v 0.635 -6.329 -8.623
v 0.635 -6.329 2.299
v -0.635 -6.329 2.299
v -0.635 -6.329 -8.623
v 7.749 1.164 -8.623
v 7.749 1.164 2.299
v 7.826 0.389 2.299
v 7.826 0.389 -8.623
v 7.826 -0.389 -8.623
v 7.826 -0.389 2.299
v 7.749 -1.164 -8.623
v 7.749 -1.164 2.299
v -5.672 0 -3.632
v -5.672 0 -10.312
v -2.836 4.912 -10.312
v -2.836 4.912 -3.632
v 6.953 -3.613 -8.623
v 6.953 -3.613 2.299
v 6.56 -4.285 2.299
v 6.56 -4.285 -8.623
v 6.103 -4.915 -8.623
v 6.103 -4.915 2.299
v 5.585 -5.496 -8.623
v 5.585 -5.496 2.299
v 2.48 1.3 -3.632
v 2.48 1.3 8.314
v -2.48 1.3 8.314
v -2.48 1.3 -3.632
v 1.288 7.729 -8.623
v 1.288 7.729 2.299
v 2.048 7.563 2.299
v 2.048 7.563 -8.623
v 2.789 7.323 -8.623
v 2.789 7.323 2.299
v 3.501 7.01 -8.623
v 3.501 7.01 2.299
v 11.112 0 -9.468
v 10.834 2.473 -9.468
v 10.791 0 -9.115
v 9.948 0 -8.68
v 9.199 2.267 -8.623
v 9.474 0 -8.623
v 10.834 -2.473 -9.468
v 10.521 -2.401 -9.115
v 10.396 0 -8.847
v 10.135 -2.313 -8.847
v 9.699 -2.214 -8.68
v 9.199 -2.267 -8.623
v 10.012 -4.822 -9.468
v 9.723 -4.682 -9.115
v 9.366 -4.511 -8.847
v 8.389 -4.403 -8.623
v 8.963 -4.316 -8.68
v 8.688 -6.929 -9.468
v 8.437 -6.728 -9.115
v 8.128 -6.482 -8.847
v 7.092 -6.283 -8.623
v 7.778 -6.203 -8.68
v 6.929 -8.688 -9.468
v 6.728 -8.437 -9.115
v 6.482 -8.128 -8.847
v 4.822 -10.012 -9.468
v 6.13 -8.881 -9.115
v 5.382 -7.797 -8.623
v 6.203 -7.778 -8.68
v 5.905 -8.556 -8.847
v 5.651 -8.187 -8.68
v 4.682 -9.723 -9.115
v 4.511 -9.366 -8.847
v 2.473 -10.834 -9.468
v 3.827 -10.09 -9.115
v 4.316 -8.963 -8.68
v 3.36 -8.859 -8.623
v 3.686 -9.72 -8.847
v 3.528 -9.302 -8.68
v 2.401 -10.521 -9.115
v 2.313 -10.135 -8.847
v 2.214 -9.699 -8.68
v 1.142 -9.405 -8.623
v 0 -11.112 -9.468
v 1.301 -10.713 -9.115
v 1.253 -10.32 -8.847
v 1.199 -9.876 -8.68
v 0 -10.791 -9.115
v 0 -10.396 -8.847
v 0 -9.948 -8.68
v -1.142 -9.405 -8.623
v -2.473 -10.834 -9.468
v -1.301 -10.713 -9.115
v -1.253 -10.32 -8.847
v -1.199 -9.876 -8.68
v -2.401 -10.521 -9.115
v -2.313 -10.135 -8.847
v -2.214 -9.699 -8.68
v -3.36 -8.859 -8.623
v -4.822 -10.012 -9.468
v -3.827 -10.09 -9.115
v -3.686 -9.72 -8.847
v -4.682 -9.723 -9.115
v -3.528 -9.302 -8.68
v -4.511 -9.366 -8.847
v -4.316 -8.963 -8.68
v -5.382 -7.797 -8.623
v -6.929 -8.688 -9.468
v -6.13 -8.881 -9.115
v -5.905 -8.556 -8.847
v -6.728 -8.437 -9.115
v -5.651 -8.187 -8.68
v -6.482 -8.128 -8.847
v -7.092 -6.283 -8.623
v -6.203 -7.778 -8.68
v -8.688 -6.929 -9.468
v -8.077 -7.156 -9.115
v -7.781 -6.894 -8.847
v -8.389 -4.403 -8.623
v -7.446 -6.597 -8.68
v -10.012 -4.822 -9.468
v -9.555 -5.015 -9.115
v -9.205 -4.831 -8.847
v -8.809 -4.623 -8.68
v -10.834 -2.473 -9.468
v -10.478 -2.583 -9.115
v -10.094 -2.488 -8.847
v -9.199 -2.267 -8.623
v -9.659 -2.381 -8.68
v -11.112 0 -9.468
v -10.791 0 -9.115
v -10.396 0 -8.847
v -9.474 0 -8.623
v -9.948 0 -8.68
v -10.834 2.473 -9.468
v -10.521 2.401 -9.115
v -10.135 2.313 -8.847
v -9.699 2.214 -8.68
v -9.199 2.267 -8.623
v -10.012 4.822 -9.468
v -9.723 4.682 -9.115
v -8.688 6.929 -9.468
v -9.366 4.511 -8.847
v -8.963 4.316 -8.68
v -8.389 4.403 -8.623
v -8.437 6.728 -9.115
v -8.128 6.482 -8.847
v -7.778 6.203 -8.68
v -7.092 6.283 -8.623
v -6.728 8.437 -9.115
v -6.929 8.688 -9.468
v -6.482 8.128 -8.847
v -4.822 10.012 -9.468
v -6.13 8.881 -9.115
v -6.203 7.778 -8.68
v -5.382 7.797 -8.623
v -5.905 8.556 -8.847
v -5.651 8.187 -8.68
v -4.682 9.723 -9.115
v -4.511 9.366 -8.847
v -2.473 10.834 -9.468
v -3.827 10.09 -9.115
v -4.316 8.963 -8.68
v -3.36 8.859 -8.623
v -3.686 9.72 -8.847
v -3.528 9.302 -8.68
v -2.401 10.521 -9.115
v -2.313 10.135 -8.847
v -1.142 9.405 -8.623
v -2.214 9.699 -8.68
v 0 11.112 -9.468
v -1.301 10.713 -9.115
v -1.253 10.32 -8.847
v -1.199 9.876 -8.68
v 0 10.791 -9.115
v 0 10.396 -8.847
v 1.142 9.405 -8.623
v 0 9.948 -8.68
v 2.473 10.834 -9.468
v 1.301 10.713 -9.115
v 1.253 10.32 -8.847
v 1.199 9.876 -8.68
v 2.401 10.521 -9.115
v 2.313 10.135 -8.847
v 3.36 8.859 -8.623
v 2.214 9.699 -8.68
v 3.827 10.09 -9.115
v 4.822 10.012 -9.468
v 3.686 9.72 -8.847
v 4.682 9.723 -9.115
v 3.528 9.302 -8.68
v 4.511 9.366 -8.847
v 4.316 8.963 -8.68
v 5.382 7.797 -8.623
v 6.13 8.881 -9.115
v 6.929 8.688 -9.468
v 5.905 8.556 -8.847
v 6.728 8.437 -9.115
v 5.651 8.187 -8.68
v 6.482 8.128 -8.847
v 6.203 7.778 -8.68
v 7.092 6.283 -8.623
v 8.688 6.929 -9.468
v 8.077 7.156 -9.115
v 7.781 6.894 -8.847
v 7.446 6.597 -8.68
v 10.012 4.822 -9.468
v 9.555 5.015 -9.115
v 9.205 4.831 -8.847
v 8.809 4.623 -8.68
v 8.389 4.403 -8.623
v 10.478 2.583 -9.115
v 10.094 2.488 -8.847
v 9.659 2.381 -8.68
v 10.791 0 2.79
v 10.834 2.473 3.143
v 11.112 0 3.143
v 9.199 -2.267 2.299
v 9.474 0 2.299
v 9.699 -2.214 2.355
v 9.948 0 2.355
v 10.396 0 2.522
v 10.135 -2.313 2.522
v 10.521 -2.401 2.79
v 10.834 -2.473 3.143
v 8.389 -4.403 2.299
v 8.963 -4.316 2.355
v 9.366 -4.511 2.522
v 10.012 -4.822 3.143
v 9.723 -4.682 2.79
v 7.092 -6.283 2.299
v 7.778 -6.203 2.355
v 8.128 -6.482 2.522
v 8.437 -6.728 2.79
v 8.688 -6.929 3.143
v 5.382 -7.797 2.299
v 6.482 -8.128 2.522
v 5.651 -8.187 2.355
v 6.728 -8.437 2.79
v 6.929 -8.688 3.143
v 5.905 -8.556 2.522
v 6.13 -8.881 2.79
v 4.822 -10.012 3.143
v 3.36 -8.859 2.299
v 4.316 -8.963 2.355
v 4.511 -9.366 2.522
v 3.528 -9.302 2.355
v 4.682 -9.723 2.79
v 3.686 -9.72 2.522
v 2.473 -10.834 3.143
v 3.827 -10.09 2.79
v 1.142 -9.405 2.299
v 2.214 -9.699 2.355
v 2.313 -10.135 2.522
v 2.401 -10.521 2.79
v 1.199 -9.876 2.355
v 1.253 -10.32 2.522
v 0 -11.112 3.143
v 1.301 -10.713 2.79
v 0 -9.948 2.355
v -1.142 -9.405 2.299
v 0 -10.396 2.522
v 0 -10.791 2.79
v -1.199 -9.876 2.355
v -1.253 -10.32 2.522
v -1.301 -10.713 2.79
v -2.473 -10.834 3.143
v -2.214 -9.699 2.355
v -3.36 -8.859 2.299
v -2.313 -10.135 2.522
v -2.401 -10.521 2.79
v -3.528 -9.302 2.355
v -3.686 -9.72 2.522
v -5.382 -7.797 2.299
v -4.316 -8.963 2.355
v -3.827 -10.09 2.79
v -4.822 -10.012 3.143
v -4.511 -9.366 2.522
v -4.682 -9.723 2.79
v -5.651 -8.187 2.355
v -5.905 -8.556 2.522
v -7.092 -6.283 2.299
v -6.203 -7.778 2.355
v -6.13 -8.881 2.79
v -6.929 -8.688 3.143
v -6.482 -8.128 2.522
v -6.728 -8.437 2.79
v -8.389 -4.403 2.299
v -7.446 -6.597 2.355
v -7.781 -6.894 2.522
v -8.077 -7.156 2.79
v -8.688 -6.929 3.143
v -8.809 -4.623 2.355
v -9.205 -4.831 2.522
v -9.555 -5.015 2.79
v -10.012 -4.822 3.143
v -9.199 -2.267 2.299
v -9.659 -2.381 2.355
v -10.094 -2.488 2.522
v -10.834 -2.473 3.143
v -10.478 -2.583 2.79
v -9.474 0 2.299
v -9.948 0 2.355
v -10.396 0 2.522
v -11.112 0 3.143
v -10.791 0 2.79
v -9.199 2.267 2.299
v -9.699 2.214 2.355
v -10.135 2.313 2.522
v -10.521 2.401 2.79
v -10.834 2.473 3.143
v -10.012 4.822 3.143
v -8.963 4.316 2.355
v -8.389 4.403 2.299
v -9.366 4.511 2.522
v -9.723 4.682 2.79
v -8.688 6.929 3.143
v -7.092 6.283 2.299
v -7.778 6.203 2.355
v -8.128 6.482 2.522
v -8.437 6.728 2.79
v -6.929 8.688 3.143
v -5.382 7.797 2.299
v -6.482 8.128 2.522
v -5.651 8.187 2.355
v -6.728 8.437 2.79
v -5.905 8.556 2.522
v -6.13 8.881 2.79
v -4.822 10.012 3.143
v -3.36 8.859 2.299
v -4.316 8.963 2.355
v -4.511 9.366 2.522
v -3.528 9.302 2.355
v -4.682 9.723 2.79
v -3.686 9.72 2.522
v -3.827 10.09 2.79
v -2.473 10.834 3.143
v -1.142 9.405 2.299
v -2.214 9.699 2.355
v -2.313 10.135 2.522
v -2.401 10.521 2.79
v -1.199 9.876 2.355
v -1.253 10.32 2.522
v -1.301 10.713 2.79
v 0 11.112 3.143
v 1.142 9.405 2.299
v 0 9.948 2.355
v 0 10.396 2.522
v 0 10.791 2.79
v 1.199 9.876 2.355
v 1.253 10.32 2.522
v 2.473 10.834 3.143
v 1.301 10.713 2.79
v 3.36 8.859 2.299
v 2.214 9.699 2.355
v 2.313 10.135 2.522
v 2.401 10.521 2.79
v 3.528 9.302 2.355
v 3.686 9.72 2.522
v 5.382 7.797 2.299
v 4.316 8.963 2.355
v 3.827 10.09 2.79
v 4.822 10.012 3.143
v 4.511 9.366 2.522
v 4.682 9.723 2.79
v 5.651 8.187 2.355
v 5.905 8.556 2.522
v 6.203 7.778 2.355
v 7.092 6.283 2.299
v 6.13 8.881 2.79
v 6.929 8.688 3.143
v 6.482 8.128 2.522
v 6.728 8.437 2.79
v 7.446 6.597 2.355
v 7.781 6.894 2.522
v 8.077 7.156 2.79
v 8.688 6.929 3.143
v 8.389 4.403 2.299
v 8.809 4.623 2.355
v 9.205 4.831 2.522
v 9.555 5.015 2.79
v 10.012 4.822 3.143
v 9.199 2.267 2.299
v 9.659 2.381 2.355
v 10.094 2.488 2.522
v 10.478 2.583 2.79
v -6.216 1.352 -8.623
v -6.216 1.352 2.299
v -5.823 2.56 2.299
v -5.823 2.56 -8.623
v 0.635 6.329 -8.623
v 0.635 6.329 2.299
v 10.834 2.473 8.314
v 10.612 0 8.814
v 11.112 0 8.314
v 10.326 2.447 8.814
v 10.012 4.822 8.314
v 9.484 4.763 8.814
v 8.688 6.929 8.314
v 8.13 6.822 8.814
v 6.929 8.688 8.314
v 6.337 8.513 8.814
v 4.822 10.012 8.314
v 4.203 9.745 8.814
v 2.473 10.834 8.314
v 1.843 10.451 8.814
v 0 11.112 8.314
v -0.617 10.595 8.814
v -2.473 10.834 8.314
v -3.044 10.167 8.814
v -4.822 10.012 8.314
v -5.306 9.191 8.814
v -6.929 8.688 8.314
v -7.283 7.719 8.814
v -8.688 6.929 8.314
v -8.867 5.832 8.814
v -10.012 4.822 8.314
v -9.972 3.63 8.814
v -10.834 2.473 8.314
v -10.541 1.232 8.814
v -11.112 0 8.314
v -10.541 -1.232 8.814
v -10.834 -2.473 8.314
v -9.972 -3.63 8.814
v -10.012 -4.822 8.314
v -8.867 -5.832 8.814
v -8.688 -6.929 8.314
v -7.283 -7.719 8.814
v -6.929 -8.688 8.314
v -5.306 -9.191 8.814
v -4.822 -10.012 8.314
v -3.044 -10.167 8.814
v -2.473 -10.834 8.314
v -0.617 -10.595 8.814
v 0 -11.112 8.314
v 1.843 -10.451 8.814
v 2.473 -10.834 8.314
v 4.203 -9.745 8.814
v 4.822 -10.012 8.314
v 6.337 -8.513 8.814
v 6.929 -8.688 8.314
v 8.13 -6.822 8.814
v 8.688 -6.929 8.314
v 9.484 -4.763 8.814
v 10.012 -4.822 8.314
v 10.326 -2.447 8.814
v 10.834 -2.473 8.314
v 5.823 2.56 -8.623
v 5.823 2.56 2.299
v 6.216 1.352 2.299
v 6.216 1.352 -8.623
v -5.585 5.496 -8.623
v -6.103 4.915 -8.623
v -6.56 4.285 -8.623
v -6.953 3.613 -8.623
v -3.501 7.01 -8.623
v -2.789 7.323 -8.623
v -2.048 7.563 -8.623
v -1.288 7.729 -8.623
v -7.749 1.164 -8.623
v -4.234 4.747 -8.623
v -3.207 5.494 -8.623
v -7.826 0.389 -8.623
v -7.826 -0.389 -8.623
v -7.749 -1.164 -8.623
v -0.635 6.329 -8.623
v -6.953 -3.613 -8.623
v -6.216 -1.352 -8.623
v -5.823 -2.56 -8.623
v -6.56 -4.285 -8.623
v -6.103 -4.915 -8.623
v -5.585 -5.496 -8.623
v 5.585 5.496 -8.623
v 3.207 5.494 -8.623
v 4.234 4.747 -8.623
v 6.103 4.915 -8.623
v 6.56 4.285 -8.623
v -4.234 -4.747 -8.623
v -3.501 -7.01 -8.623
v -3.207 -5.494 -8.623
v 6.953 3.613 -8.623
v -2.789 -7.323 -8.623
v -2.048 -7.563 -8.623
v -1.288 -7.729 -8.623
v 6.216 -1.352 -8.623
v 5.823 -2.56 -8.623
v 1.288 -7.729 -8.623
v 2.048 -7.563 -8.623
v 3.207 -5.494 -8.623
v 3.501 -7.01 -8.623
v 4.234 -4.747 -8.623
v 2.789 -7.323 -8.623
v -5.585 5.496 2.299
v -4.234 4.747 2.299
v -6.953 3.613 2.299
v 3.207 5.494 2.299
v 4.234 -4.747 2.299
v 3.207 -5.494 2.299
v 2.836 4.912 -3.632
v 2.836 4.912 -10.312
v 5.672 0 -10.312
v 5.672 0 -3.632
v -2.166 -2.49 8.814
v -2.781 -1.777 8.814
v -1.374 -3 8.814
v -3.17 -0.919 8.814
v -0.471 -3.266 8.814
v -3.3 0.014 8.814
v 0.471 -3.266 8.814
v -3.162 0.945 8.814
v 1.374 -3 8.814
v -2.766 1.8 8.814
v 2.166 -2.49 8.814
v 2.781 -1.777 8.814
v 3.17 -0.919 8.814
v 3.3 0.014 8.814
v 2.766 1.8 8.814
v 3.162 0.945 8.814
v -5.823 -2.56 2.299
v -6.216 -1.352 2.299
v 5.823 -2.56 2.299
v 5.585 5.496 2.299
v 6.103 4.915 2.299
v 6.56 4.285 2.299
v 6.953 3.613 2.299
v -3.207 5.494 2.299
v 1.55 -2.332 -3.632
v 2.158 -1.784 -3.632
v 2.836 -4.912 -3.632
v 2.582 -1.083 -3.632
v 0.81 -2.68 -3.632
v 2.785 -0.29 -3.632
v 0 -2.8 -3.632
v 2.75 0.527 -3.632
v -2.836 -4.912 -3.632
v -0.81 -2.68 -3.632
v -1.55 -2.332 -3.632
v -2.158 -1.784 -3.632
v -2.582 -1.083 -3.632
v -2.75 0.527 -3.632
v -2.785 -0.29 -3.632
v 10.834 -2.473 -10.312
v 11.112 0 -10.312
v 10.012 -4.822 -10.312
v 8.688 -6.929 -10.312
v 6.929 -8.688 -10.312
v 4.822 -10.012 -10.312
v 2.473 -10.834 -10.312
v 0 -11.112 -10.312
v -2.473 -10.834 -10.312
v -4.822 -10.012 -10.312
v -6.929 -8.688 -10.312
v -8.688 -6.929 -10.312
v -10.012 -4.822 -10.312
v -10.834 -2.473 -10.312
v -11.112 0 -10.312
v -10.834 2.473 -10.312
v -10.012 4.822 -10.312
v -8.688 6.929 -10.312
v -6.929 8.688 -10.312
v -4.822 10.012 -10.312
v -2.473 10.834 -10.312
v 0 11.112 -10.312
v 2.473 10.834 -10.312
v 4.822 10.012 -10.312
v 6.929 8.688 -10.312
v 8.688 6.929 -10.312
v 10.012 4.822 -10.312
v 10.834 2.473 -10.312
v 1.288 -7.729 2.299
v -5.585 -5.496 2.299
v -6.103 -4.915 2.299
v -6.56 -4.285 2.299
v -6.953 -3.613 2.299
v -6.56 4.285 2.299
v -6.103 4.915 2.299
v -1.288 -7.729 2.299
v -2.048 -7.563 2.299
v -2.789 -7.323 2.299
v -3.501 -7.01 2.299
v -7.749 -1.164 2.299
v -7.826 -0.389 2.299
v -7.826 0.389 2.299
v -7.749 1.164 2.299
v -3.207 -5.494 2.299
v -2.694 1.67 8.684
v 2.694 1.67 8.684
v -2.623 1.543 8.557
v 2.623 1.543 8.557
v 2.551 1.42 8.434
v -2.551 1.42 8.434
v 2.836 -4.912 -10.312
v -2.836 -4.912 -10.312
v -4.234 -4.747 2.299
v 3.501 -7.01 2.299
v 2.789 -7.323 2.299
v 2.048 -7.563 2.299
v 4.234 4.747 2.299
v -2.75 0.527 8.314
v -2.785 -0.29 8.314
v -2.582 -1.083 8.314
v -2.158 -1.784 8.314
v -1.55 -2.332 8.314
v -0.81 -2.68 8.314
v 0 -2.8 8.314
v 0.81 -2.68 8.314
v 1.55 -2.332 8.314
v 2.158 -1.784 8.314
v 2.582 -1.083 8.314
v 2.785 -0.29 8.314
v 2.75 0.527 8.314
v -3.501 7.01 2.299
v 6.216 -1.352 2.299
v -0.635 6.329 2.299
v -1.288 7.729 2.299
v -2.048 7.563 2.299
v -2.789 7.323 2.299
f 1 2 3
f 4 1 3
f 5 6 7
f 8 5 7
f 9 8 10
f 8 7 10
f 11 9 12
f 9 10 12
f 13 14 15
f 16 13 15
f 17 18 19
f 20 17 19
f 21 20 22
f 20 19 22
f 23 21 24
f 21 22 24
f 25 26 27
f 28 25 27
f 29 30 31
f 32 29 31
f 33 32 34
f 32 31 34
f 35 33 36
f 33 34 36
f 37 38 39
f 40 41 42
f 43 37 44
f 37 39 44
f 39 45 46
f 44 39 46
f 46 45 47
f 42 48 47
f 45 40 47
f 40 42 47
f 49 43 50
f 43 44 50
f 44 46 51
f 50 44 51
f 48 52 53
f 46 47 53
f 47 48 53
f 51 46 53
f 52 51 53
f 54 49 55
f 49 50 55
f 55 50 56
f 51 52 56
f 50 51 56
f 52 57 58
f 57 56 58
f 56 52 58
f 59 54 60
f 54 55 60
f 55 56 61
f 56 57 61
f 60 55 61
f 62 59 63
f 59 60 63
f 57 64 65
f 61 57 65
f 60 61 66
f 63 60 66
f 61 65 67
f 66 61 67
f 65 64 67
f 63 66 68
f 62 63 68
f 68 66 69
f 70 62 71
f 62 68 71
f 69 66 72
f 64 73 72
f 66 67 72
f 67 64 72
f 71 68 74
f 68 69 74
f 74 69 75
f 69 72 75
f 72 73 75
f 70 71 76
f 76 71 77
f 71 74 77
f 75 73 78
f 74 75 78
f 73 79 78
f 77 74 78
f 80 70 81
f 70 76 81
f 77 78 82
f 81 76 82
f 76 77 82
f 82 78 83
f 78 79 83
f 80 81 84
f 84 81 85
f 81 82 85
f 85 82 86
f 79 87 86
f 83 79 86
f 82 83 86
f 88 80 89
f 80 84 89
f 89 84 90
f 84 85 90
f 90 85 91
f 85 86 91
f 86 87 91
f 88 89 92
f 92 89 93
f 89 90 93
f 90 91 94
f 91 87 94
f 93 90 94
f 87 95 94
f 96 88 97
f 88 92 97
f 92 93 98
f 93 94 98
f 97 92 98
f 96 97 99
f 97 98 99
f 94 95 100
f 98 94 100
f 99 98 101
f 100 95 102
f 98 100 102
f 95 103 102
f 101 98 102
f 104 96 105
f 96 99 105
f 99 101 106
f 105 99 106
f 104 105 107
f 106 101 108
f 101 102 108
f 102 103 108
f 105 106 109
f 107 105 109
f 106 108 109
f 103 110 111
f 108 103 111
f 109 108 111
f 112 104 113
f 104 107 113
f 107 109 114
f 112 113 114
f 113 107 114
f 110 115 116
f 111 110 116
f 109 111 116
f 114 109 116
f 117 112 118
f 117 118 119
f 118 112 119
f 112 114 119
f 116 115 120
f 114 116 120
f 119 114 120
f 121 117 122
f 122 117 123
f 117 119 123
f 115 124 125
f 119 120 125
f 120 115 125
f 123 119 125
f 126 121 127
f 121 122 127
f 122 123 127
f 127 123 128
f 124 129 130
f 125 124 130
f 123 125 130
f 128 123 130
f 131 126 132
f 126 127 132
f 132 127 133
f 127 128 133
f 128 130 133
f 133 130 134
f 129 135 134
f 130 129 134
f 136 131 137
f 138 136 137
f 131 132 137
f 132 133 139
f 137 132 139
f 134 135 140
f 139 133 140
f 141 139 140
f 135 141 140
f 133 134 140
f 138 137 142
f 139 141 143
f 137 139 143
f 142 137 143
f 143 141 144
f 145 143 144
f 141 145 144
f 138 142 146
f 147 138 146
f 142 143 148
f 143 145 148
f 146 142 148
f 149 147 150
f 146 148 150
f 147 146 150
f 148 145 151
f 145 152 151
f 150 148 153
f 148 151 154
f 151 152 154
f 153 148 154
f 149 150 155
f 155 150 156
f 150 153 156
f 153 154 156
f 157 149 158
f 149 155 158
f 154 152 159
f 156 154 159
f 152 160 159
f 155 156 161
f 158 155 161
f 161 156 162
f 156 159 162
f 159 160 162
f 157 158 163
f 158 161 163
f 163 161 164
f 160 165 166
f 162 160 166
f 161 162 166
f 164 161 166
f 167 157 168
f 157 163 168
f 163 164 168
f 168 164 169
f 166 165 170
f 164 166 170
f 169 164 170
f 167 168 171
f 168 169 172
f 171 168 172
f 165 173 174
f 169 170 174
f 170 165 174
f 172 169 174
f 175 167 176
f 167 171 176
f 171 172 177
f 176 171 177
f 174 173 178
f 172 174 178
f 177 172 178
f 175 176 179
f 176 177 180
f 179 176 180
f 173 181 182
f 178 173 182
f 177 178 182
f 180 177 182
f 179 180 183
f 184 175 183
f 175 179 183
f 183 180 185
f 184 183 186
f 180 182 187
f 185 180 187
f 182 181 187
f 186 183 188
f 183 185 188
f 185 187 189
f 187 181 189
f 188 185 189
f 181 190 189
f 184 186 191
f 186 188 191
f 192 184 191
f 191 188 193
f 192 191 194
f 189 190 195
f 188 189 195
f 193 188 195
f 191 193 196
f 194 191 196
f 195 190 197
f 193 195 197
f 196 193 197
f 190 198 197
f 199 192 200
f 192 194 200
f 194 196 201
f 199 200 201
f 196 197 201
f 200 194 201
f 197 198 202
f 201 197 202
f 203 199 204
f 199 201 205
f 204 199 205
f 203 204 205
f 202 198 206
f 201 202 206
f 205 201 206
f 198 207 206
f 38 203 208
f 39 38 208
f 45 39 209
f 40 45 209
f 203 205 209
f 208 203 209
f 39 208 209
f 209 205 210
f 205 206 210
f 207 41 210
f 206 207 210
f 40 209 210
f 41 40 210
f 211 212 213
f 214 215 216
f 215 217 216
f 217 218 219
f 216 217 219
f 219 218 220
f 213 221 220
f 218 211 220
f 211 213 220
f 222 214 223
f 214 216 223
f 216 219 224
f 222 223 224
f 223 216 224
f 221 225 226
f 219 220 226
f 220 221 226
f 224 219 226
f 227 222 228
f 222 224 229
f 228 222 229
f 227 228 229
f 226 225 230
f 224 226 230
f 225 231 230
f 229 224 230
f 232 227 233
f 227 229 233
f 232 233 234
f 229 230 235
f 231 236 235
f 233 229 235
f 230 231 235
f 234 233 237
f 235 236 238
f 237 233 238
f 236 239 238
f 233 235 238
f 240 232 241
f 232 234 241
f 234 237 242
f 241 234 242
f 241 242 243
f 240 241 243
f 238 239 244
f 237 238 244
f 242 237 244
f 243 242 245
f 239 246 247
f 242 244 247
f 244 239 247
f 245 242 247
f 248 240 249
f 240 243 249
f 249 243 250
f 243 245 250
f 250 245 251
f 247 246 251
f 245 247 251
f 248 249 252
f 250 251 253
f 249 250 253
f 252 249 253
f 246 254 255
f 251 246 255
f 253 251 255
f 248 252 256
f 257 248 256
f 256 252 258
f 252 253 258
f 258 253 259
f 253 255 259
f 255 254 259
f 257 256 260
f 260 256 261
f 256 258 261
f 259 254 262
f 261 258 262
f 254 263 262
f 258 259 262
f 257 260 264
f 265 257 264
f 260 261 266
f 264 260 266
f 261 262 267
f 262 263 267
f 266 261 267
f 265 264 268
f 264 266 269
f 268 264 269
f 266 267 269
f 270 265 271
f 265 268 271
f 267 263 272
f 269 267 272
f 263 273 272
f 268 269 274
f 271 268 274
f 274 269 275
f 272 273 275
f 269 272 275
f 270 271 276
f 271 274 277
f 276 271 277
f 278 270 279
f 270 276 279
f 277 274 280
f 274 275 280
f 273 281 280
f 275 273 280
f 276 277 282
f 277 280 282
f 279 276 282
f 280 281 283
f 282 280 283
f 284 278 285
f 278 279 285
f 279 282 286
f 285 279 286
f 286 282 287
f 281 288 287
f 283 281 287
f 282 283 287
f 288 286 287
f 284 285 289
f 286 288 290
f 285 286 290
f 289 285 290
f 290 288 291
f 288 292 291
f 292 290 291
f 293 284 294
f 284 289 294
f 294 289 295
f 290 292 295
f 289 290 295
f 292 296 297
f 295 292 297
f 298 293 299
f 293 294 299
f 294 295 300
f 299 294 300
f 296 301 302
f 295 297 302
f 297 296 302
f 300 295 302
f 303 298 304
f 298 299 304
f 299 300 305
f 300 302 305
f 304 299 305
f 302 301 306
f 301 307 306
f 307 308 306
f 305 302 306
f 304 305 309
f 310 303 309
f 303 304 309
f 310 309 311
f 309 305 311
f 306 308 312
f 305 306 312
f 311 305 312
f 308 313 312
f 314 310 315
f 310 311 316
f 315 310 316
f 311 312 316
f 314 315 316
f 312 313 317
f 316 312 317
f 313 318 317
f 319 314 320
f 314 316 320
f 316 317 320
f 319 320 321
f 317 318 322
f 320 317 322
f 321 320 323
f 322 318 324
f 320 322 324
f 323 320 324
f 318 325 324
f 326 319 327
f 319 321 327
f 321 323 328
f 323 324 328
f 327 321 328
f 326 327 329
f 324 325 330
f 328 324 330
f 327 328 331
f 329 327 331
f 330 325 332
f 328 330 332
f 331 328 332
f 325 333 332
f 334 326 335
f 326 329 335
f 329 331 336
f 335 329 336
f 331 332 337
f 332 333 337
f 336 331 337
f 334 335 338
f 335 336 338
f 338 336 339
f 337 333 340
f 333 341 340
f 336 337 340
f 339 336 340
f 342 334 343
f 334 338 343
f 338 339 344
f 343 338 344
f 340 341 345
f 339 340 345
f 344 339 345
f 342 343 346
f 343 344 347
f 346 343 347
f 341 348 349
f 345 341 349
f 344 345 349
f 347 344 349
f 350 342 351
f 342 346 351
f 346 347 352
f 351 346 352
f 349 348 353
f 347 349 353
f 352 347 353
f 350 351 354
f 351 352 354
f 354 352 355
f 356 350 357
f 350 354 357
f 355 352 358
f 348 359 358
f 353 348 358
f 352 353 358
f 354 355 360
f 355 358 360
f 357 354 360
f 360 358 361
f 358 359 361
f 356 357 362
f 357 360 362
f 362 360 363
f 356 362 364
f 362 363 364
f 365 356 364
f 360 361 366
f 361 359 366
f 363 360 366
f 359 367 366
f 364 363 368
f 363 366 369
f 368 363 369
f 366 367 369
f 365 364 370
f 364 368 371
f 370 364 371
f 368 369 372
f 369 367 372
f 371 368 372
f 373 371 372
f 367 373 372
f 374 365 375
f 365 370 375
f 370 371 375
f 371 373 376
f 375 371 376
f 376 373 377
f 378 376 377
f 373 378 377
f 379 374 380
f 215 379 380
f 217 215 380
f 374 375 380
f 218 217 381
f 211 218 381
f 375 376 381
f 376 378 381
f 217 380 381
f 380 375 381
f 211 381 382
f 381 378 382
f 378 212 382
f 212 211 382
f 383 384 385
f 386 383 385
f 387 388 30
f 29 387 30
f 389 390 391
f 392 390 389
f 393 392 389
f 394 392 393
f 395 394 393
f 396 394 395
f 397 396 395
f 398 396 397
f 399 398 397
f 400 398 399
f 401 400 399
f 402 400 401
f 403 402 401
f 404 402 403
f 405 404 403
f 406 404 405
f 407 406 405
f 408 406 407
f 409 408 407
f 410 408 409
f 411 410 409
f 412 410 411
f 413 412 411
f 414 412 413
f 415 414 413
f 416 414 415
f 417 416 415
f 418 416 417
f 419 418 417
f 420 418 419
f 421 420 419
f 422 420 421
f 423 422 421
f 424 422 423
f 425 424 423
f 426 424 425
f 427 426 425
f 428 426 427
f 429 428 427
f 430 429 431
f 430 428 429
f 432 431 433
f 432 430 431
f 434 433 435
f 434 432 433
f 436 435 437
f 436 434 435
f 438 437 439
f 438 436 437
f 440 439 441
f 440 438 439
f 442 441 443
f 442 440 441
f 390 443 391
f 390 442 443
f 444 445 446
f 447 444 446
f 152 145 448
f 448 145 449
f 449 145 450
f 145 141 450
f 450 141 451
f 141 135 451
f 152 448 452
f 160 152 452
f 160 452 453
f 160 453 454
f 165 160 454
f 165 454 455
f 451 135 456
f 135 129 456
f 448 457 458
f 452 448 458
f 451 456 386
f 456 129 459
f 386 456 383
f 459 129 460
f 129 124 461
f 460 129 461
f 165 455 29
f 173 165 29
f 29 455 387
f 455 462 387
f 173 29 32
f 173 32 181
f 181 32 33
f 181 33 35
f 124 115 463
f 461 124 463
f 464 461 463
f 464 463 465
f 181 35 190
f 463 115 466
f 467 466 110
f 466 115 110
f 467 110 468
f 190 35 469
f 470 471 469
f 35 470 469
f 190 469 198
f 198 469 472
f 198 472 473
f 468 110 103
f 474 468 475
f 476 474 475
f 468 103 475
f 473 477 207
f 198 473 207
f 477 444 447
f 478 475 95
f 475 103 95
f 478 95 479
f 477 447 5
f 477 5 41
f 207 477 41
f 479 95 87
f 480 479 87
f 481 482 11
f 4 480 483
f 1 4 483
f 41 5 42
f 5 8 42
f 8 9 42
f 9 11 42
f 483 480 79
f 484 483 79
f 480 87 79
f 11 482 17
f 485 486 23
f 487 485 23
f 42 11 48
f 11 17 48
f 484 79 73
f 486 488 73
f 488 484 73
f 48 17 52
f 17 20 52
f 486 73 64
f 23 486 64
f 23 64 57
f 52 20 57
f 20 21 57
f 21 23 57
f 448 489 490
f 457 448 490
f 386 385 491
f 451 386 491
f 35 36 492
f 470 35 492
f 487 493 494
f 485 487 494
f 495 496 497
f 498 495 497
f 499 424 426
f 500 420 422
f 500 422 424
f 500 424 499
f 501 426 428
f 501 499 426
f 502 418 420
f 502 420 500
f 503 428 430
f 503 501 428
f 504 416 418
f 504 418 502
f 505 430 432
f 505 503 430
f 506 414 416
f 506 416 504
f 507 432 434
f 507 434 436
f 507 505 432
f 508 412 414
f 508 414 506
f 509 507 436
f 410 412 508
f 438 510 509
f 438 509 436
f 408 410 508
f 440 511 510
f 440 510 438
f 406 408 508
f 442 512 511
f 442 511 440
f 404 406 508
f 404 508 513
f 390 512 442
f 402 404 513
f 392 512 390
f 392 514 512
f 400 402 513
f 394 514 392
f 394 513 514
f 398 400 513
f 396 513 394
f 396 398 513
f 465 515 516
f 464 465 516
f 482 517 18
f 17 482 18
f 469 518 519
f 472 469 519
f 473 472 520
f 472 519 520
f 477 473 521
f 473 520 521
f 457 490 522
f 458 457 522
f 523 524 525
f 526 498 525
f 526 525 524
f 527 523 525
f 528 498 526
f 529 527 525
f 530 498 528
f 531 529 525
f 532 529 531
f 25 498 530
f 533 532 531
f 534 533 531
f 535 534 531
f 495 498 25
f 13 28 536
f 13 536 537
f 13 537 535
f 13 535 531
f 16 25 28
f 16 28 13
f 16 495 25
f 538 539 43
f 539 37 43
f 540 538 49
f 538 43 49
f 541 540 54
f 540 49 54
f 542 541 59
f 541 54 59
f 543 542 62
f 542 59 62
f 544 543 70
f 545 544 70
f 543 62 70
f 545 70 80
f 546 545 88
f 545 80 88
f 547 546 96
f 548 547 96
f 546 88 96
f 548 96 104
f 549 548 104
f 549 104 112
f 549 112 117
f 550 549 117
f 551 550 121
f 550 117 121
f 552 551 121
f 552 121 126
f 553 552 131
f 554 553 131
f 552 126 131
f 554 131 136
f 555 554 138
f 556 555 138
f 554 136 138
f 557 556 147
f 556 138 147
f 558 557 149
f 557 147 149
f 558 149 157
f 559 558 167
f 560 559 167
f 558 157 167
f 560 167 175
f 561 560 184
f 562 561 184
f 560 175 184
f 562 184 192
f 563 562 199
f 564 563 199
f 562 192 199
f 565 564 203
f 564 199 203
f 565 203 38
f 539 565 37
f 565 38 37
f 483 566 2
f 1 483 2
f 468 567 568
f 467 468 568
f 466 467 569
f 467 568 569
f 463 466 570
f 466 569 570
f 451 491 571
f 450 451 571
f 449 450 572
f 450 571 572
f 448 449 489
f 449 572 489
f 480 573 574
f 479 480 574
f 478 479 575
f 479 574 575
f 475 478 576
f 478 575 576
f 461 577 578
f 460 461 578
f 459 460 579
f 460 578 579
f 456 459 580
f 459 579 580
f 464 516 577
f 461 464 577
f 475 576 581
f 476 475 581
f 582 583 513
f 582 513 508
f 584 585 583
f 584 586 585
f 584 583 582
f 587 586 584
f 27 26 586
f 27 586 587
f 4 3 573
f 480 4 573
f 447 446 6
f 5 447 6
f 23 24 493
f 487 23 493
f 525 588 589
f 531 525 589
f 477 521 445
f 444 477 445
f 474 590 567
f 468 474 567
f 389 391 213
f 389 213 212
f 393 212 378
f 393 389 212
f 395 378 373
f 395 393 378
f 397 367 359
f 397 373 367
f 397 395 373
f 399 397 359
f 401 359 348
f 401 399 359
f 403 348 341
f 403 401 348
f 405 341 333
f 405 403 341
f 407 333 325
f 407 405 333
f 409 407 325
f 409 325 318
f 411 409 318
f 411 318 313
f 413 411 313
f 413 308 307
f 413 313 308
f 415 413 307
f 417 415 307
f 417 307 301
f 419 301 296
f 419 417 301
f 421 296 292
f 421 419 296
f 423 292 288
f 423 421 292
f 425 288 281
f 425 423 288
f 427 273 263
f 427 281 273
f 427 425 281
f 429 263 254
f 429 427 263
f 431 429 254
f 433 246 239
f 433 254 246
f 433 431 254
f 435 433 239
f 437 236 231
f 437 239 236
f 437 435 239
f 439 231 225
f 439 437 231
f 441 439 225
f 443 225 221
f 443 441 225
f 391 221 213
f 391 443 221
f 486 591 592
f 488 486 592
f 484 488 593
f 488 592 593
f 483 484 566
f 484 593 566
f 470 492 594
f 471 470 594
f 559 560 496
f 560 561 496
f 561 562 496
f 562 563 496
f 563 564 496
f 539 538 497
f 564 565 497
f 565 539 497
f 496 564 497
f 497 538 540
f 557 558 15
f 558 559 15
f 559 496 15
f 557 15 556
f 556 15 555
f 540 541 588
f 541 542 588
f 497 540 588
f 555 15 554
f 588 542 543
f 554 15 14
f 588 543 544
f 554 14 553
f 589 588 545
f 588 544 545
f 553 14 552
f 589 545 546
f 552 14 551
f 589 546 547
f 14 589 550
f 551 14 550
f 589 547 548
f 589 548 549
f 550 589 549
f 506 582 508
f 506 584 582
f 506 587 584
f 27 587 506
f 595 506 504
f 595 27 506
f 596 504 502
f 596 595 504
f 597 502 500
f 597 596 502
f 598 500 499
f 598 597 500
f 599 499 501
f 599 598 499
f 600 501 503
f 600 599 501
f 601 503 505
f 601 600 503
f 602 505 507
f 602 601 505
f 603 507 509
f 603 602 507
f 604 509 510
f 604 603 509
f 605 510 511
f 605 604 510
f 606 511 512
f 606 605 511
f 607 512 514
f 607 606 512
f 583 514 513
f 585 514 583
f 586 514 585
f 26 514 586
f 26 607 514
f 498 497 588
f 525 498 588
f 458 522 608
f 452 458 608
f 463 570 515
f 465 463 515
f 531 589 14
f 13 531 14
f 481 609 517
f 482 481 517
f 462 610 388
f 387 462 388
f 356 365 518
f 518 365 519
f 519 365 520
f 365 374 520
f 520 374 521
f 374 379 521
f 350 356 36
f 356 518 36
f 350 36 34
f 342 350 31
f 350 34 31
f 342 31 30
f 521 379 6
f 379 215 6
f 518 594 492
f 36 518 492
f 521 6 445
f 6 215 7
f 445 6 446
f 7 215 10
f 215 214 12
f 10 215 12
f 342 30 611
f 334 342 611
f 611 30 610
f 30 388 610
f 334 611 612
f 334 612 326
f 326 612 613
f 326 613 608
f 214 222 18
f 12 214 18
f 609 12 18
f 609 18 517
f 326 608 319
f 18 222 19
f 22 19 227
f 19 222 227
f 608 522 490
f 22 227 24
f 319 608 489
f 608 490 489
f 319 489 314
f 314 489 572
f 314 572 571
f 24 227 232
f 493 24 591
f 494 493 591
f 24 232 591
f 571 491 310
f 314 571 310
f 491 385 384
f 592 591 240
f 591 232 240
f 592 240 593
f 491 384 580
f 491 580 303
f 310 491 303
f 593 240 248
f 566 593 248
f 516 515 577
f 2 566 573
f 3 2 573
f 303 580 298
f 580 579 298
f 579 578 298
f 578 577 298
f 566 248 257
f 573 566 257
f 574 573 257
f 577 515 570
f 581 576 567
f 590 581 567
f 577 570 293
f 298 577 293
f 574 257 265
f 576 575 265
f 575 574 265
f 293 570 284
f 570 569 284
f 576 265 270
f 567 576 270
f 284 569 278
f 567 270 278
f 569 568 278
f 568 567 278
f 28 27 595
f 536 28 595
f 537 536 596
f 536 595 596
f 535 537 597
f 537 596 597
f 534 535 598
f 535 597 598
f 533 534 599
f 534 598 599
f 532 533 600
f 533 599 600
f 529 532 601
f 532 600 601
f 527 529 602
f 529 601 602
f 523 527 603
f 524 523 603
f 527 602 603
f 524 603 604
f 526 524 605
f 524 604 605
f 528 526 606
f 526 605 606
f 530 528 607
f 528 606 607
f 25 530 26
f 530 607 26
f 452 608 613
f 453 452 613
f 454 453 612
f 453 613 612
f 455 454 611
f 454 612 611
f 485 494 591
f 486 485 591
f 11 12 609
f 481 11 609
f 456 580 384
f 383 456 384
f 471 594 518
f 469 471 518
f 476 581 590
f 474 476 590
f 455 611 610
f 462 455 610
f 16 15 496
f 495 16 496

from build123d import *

# Parameters (mm, degrees)
CUT_EXTRUDE1_START  = 2.2987
CUT_EXTRUDE1_DEPTH  = 10.922
CIRPATTERN1_COUNT   = 10
BOSS_EXTRUDE1_START = -7.62
BOSS_EXTRUDE1_DEPTH = 7.62
CUT_EXTRUDE2_DEPTH  = 6.6802
BOSS_EXTRUDE2_START = 4.826
SKETCH8_R           = 11.1125
BOSS_EXTRUDE2_DEPTH = 4.826
CUT_EXTRUDE3_DEPTH  = 24.384
CHAMFER2_SIZE       = 0.5


with BuildPart() as part:
    # Sketch2 → Revolve1 (revolve)
    with BuildSketch(Plane(origin=(0, 0, 0), x_dir=(0, 0, -1), z_dir=(1, 0, 0)), mode=Mode.PRIVATE) as revolve1_sk:
        with BuildLine():
            Line((-3.9878, 2.5), (10.3124, 2.5))
            Line((10.3124, 2.5), (10.3124, 11.1125))
            Line((10.3124, 11.1125), (9.46785, 11.1125))
            ThreePointArc((9.46785, 11.1125), (8.846862309, 10.395787163), (8.6233, 9.4742))
            Line((8.6233, 9.4742), (8.6233, 7.8359))
            Line((8.6233, 7.8359), (-2.2987, 7.8359))
            Line((-2.2987, 7.8359), (-2.2987, 9.4742))
            ThreePointArc((-2.2987, 9.4742), (-2.522262309, 10.395787163), (-3.14325, 11.1125))
            Line((-3.14325, 11.1125), (-3.9878, 11.1125))
            Line((-3.9878, 11.1125), (-3.9878, 2.5))
        make_face()
    revolve(revolve1_sk.sketch.rotate(Axis((0, 0, 10.3124), (0, 0, -1)), 90), axis=Axis((0, 0, 10.3124), (0, 0, -1)))

    # Sketch3 → Cut-Extrude1 (cut)
    with BuildSketch(Plane.XY.offset(CUT_EXTRUDE1_START)):
        with BuildLine():
            Line((-0.635, 6.329348022), (0.635, 6.329348022))
            Line((0.635, 6.329348022), (1.287830721, 7.729348022))
            ThreePointArc((1.287830721, 7.729348022), (0, 7.8359), (-1.287830721, 7.729348022))
            Line((-1.287830721, 7.729348022), (-0.635, 6.329348022))
        make_face()
    cut_extrude1 = extrude(amount=-CUT_EXTRUDE1_DEPTH, mode=Mode.SUBTRACT)

    # CirPattern1: Cut-Extrude1 ×10 about axis
    cirpattern1_axis = Axis((0, 0, 0), (0, 0, 1))
    for i in range(1, CIRPATTERN1_COUNT):
        add(cut_extrude1.rotate(cirpattern1_axis, i * 360 / CIRPATTERN1_COUNT), mode=Mode.SUBTRACT)

    # Sketch5 → Boss-Extrude1 (add)
    with BuildSketch(Plane.XY.offset(3.9878).offset(BOSS_EXTRUDE1_START)):
        with BuildLine():
            Line((-2.291287847, 1), (2.291287847, 1))
            ThreePointArc((2.291287847, 1), (0, 2.5), (-2.291287847, 1))
        make_face()
    extrude(amount=BOSS_EXTRUDE1_DEPTH)

    # Sketch6 → Cut-Extrude2 (cut)
    with BuildSketch(Plane(origin=(0, 0, -10.3124), x_dir=(-1, 0, 0), z_dir=(0, 0, -1))):
        Polygon((5.672466395, 0), (2.836233197, 4.9125), (-2.836233197, 4.9125), (-5.672466395, 0), (-2.836233197, -4.9125), (2.836233197, -4.9125), align=None)
    extrude(amount=-CUT_EXTRUDE2_DEPTH, mode=Mode.SUBTRACT)

    # Sketch8 → Boss-Extrude2 (add)
    with BuildSketch(Plane.XY.offset(3.9878).offset(BOSS_EXTRUDE2_START)):
        Circle(SKETCH8_R)
        with BuildLine():
            Line((2.291287847, 1), (-2.291287847, 1))
            ThreePointArc((-2.291287847, 1), (0, -2.5), (2.291287847, 1))
        make_face(mode=Mode.SUBTRACT)
    extrude(amount=-BOSS_EXTRUDE2_DEPTH)

    # Sketch12 → Cut-Extrude3 (cut)
    with BuildSketch(Plane.XY.offset(8.8138)):
        with BuildLine():
            Line((2.479919354, 1.3), (-2.479919354, 1.3))
            ThreePointArc((-2.479919354, 1.3), (0, -2.8), (2.479919354, 1.3))
        make_face()
    extrude(amount=-CUT_EXTRUDE3_DEPTH, mode=Mode.SUBTRACT)

    # Chamfer2
    chamfer2_edges = [part.edges().sort_by_distance(p)[0] for p in [
        (-11.1125, 0, 8.8138),
        (0, -2.8, 8.8138),
        (0, 1.3, 8.8138),
    ]]
    chamfer(chamfer2_edges, length=CHAMFER2_SIZE)


solid = part.part
